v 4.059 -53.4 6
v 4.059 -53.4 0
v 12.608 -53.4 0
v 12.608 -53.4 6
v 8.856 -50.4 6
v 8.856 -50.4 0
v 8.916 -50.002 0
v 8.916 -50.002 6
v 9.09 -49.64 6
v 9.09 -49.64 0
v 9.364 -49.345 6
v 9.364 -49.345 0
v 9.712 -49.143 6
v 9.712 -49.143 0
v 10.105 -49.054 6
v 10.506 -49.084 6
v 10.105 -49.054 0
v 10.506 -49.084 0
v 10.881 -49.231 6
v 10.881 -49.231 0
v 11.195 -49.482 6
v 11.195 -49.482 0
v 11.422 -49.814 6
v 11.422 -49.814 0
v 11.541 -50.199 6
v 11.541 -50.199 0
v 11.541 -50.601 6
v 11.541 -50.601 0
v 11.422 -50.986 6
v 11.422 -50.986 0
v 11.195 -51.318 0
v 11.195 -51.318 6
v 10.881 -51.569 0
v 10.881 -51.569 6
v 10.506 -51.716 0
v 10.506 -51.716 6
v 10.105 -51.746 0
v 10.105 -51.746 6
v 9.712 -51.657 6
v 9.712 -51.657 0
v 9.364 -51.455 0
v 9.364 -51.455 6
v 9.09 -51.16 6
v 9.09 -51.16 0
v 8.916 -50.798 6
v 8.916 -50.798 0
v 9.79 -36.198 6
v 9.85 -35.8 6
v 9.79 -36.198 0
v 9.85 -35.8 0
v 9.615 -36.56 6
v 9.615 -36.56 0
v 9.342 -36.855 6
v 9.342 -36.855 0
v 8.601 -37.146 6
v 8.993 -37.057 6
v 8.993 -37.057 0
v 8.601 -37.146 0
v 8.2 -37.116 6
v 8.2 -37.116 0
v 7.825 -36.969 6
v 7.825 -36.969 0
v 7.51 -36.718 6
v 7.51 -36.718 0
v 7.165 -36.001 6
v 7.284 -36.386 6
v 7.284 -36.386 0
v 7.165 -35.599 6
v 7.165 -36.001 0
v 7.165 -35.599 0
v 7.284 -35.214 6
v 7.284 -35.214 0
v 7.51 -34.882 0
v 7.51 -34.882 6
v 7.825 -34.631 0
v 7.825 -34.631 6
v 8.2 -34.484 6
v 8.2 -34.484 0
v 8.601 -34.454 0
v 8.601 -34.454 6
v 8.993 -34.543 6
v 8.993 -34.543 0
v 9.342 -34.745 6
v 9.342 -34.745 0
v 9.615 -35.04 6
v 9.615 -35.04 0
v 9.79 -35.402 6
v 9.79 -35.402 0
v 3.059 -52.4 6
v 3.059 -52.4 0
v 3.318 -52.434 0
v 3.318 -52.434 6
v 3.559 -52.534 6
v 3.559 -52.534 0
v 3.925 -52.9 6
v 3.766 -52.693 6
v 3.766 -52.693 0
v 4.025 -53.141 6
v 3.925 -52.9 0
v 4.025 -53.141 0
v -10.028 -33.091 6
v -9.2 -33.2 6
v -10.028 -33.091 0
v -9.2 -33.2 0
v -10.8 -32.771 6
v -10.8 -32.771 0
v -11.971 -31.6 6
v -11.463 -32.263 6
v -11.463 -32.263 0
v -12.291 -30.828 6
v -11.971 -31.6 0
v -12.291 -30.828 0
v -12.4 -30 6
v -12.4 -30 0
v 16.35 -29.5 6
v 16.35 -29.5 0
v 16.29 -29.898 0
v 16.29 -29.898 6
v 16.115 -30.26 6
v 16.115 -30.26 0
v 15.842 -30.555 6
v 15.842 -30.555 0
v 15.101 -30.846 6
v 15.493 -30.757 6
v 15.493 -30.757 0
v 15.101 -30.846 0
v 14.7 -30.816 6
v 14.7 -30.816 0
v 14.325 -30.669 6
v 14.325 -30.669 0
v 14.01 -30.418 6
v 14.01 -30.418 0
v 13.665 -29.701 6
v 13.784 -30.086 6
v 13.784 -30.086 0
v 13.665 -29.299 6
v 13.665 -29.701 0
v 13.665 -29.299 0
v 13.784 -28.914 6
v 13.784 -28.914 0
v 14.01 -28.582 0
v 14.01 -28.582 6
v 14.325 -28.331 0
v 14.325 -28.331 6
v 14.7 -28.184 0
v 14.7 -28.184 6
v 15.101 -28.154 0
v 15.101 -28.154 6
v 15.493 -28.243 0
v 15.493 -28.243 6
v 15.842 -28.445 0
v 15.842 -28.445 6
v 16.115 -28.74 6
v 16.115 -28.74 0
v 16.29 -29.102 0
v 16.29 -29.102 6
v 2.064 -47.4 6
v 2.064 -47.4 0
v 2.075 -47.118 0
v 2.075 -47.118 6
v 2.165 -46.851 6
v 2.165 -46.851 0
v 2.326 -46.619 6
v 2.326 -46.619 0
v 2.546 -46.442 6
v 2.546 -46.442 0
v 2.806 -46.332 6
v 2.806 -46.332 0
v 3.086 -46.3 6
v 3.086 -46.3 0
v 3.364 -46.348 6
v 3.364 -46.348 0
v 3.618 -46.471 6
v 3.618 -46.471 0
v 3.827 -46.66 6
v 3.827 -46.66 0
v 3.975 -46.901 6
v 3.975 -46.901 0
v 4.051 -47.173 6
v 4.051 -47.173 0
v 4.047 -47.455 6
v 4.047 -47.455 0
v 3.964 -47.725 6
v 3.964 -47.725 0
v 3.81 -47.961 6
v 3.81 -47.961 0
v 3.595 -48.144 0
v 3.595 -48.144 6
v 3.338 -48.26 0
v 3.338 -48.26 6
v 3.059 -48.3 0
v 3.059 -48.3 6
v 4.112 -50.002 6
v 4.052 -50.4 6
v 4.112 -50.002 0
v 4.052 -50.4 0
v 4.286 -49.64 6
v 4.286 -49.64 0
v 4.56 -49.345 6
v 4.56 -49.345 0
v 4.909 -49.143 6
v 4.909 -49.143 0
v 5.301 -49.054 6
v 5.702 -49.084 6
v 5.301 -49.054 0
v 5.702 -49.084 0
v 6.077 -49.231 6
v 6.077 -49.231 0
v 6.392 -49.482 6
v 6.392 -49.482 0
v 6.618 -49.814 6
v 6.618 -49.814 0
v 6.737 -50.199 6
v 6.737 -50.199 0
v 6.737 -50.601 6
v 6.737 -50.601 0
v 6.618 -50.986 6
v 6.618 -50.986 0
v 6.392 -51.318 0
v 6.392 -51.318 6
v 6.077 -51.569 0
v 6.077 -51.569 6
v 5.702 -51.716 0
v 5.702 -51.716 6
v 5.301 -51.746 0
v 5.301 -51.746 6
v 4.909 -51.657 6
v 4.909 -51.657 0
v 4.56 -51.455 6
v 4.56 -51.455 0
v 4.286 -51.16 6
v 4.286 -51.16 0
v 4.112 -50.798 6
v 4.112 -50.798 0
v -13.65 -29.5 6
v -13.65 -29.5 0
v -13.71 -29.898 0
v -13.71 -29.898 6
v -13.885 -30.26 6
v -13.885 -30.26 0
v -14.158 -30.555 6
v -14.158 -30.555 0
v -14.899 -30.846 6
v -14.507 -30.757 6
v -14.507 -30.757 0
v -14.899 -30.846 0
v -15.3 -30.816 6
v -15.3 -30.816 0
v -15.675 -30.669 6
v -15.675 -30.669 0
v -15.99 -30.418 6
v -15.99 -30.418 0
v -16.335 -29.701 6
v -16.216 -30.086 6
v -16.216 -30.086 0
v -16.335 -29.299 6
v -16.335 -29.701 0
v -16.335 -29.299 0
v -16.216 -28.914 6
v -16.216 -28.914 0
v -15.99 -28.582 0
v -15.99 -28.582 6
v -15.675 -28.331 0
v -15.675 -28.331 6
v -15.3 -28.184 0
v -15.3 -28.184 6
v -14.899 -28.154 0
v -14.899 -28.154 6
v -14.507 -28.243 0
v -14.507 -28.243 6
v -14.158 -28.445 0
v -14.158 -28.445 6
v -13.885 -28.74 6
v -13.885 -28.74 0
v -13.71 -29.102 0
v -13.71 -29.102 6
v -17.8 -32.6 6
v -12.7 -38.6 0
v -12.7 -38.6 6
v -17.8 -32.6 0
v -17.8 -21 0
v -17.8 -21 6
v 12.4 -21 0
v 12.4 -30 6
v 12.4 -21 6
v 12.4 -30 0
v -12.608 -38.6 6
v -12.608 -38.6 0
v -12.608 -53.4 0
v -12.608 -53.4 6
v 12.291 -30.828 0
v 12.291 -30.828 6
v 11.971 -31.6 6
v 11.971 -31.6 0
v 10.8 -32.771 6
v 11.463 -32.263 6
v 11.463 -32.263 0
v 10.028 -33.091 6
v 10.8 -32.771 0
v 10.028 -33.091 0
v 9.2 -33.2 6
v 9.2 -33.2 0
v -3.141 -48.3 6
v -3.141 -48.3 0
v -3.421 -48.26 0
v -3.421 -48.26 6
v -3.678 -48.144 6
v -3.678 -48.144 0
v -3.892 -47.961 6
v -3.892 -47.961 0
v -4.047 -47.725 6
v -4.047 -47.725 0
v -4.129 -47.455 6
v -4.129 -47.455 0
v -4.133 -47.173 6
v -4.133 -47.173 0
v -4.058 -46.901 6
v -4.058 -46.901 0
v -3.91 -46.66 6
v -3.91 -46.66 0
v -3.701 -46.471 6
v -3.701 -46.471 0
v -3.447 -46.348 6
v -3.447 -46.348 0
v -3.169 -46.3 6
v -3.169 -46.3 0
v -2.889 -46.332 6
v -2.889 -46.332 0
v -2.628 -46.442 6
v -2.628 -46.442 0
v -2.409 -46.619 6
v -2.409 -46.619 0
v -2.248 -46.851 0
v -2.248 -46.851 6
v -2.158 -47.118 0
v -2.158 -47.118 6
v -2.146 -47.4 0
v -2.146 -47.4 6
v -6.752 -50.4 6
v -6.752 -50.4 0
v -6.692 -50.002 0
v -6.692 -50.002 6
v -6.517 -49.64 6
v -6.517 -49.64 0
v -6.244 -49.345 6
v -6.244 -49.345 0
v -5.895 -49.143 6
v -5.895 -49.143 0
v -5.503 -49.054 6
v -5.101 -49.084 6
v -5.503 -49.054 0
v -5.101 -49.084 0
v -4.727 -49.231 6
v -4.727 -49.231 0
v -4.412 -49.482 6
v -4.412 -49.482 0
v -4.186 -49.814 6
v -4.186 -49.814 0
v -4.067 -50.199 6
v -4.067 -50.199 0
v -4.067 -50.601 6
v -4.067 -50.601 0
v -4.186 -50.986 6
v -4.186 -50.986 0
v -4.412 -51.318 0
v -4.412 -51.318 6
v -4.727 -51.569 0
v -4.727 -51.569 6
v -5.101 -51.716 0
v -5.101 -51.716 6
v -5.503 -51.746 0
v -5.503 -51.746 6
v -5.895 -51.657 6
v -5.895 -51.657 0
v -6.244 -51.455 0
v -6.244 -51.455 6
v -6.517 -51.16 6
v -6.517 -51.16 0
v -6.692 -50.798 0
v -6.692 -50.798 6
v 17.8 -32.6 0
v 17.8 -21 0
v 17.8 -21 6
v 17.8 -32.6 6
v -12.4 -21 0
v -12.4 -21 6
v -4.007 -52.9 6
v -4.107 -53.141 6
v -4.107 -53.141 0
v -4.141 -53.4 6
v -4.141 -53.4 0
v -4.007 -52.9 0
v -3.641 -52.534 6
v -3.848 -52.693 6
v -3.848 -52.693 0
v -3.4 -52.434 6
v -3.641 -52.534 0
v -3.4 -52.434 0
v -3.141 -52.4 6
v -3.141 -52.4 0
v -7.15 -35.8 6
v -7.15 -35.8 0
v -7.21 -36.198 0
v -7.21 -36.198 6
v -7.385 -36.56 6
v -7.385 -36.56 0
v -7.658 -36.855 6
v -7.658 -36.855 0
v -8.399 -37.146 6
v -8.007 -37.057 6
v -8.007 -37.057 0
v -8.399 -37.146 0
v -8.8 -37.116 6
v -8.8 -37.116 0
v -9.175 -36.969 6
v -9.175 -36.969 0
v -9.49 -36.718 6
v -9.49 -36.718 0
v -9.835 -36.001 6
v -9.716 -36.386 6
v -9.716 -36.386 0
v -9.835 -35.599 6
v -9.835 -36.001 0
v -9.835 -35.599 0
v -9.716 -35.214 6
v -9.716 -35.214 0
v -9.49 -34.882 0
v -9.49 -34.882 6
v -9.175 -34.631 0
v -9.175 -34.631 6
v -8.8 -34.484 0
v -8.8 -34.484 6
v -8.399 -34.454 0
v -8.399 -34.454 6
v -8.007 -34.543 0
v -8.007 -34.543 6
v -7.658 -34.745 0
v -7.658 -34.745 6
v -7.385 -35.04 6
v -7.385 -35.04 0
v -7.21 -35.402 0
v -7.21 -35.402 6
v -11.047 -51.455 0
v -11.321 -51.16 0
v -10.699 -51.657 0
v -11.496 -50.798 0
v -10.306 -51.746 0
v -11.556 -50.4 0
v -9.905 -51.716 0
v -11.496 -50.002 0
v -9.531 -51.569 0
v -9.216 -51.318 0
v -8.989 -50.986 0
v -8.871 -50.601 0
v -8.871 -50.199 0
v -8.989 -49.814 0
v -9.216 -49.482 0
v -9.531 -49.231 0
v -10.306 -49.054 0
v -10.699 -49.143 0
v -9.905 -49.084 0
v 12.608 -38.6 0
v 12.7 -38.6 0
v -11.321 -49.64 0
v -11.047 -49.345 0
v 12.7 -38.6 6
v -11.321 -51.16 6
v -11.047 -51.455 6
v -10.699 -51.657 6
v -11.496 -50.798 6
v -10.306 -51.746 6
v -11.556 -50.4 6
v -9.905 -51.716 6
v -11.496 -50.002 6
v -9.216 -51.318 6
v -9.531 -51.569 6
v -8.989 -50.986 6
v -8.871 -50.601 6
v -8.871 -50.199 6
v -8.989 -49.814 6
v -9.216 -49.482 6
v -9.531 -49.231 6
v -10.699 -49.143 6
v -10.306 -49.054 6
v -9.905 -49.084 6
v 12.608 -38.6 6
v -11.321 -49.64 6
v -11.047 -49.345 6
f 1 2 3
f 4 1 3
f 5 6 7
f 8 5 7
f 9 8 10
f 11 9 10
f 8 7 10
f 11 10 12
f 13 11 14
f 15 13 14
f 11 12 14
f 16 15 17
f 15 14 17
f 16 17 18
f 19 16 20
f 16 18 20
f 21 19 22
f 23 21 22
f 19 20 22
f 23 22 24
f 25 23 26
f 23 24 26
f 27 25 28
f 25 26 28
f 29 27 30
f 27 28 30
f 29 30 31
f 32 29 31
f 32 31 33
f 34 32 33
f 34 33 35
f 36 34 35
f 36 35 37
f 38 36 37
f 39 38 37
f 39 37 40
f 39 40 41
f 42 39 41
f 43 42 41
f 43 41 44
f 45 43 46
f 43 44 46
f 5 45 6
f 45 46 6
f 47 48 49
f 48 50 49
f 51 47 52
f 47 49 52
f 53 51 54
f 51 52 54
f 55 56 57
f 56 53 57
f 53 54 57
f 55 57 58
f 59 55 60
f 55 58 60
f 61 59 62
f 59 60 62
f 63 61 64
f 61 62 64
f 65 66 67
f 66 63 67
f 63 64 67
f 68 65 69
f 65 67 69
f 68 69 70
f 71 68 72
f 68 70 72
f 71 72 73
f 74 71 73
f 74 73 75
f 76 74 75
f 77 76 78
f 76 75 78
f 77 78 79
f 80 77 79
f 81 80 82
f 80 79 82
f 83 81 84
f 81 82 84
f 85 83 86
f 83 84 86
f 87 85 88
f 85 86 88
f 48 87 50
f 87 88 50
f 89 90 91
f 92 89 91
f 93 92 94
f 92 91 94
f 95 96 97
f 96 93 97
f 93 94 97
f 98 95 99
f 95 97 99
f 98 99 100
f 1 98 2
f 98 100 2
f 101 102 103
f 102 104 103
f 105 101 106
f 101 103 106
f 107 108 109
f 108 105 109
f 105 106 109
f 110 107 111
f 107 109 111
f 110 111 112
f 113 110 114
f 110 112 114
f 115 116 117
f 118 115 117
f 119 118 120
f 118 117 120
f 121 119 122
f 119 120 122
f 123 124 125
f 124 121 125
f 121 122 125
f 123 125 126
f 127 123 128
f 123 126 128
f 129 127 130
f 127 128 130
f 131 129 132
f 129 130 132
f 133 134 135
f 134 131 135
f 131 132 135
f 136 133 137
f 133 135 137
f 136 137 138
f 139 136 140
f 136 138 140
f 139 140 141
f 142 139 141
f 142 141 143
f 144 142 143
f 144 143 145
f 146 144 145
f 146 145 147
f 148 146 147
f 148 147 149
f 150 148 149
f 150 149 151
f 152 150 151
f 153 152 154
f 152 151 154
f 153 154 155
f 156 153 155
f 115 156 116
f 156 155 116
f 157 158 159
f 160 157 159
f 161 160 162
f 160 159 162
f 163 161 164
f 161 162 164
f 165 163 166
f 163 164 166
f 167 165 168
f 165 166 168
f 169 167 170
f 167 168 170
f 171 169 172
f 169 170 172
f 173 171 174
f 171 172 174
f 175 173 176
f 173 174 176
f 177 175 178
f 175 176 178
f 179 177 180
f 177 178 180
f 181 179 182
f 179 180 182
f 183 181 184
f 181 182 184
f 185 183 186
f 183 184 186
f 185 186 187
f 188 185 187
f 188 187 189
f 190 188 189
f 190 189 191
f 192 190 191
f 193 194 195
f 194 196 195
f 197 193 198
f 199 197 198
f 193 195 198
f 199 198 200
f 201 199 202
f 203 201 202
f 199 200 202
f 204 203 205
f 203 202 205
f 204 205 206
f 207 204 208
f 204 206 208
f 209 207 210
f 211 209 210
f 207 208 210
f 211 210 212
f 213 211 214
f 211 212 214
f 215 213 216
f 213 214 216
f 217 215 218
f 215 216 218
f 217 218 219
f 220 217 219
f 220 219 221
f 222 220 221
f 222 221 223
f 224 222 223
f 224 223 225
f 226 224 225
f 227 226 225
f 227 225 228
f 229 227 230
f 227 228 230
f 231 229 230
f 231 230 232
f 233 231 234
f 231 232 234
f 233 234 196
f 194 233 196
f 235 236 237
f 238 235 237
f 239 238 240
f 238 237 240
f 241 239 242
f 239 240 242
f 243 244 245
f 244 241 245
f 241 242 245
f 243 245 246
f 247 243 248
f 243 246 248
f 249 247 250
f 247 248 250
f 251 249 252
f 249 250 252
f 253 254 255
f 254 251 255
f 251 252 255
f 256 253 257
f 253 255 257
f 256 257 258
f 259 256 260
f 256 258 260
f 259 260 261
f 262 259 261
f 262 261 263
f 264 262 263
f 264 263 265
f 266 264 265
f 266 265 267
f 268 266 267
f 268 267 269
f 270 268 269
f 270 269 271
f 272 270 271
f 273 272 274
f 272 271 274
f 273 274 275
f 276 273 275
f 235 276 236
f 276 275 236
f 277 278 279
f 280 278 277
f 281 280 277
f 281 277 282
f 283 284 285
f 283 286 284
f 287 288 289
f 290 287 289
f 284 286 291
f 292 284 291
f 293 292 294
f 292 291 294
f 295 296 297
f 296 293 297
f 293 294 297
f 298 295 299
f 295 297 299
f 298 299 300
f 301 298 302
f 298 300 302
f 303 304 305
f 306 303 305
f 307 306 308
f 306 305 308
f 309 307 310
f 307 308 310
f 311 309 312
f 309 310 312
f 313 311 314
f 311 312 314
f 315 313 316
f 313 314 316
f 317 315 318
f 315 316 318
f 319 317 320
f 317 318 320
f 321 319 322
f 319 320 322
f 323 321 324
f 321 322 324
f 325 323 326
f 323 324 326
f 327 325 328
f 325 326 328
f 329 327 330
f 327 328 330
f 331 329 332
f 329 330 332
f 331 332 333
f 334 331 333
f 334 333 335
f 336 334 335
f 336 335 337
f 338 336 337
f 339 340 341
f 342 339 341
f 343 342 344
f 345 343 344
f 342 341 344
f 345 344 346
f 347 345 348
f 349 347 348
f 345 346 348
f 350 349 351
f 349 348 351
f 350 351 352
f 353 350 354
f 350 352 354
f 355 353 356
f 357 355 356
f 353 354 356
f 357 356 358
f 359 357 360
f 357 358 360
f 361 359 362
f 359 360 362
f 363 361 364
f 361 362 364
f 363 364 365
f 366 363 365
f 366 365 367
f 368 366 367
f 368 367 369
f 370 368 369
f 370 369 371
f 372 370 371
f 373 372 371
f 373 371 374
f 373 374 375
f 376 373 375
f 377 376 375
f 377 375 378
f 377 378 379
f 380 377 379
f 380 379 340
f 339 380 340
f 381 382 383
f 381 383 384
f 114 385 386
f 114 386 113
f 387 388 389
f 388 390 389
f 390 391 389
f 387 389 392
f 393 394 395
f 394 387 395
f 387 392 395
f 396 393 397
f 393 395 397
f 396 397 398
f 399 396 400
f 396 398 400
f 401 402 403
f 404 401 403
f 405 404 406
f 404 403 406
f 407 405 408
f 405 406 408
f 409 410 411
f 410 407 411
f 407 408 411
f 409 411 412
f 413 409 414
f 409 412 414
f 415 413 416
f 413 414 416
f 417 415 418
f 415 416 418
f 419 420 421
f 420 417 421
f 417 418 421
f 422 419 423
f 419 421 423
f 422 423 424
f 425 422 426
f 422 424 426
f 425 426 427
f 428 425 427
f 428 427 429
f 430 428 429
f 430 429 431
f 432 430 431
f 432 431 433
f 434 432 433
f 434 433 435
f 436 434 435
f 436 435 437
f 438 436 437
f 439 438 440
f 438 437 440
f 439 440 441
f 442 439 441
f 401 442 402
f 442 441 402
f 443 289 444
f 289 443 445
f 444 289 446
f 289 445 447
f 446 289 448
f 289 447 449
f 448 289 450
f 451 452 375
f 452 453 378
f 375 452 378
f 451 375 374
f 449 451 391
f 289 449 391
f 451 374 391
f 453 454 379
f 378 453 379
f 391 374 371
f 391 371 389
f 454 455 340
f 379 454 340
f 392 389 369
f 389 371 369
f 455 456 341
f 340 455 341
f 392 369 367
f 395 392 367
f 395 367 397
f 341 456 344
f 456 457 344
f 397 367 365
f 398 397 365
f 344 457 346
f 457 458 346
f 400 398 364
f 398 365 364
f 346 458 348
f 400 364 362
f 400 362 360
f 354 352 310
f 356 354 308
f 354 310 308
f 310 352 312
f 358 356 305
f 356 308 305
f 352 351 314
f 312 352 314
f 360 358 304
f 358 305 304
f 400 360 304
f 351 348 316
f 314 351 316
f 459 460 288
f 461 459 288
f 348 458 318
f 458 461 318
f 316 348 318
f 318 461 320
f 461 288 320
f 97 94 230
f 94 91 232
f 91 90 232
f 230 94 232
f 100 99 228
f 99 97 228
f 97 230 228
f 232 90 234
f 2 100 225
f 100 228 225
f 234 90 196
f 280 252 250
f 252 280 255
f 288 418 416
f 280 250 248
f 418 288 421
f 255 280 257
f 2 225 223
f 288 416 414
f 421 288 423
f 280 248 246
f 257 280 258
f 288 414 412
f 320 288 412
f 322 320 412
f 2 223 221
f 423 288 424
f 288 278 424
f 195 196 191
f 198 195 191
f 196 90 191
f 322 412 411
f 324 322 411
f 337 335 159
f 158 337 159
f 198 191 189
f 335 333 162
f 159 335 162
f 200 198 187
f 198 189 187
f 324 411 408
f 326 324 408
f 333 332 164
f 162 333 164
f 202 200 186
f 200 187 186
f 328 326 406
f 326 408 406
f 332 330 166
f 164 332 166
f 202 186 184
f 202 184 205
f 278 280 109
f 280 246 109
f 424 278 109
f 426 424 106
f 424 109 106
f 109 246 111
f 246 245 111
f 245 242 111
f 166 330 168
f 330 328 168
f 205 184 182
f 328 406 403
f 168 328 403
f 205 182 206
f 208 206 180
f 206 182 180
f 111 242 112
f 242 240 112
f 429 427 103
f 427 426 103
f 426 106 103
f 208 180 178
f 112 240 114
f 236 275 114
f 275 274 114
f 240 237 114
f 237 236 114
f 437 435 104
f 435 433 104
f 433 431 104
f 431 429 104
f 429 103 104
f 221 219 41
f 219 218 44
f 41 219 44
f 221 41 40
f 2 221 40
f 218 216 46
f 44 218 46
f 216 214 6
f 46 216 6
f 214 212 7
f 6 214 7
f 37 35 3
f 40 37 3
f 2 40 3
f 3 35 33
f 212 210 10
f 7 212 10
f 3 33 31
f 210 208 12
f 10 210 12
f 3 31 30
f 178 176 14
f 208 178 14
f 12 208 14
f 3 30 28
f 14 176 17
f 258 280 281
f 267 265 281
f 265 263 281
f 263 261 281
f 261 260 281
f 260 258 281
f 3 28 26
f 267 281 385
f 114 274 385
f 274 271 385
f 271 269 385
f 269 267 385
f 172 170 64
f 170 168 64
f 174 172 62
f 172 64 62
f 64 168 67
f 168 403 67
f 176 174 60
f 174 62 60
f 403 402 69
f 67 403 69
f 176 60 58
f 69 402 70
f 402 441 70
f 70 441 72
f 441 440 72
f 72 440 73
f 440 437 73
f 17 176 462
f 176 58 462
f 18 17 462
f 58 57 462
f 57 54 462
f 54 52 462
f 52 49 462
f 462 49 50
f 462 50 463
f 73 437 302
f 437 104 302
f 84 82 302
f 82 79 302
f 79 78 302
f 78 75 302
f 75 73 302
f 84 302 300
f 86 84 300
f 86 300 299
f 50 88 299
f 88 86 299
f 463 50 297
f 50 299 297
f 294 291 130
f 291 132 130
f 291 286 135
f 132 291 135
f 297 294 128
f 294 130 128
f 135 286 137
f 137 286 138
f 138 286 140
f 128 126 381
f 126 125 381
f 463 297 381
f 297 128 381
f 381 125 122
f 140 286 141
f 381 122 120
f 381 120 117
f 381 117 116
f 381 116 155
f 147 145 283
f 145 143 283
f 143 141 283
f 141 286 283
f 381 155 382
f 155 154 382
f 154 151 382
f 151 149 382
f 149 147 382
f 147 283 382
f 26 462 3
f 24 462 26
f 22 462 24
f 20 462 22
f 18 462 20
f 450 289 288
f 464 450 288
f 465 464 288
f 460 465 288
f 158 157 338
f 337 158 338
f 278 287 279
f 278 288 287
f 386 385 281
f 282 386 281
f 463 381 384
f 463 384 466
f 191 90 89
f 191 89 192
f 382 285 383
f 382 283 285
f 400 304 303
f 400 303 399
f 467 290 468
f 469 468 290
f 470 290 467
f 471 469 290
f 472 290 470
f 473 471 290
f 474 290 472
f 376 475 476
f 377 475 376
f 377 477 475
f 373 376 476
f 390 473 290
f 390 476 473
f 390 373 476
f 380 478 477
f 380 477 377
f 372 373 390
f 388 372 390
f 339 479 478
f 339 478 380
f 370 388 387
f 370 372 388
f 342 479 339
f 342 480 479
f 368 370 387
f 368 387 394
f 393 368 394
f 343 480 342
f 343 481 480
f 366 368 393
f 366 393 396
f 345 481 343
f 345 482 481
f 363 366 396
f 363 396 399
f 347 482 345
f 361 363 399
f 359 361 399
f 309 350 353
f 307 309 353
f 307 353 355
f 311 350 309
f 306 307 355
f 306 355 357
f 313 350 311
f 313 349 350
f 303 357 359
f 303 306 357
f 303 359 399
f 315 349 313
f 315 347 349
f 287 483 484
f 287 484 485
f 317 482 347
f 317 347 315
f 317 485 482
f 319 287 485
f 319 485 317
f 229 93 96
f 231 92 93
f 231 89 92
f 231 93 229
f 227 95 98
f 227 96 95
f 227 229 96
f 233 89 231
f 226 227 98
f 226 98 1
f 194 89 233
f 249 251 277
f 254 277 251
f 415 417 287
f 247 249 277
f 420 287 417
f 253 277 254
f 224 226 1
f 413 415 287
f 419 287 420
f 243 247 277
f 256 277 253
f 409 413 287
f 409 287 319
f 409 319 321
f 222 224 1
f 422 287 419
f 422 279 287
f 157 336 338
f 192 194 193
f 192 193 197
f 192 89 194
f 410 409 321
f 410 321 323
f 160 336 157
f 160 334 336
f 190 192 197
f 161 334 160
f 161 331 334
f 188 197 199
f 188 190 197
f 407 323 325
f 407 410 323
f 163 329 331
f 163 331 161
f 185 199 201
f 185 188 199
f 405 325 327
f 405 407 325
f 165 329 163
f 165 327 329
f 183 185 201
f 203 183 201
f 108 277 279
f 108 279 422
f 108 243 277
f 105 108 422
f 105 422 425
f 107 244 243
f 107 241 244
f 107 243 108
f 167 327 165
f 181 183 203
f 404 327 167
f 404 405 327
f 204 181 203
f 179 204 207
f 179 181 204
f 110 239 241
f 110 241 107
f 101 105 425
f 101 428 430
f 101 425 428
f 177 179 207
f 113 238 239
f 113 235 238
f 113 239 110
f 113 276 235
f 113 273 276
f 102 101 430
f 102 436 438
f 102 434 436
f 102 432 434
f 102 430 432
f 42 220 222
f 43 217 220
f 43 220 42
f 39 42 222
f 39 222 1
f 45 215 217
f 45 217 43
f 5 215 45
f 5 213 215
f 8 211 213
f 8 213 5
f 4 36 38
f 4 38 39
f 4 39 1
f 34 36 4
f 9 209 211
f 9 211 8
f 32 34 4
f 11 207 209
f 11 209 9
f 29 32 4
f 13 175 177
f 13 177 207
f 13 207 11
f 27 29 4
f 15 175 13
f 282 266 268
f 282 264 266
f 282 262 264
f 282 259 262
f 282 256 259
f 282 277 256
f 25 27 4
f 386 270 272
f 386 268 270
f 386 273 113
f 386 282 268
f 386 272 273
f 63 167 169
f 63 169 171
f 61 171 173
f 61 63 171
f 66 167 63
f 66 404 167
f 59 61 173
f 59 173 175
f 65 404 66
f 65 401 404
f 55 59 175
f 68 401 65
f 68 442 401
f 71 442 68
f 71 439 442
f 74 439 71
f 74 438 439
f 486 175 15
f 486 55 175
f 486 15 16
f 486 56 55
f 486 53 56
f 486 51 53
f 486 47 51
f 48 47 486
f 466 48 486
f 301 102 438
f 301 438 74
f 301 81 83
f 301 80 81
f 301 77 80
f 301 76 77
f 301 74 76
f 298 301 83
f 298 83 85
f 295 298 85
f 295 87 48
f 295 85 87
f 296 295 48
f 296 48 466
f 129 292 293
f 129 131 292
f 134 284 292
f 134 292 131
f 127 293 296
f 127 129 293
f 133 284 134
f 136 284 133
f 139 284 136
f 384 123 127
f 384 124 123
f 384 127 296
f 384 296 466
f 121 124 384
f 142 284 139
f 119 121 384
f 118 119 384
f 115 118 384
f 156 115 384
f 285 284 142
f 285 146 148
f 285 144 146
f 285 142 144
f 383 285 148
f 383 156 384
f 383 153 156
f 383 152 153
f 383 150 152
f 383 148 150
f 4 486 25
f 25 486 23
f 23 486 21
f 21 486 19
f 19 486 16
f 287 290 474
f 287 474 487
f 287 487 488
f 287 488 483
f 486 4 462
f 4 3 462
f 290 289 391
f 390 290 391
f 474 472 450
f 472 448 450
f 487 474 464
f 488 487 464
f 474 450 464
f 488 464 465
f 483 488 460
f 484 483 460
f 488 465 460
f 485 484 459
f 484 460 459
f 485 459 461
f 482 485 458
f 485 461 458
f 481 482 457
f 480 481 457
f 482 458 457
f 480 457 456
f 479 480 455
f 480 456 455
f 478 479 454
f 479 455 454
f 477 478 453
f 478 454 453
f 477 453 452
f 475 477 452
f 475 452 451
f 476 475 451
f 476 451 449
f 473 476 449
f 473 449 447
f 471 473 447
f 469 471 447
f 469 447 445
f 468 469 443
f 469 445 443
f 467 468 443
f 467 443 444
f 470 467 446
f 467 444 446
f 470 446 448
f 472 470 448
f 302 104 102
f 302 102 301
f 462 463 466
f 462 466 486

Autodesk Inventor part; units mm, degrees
ref_plane "YZ Plane" through (0, 0, 0) normal (1, 0, 0) x (0, 1, 0)
ref_plane "XZ Plane" through (0, 0, 0) normal (0, 1, 0) x (-1, 0, 0)
ref_plane "XY Plane" through (0, 0, 0) normal (0, 0, 1) x (1, 0, 0)
sketch "스케치1" plane through (0, 0, 0) normal (0, 0, 1) x (1, 0, 0)
  line L0 (7.15, 10.1828) -> (7.15, 9) projected
  arc A0 (7.15, 9) -> (9.15, 7) centre (9.15, 9) ccw projected
  line L1 (9.15, 7) -> (11.2, 7) projected
  arc A1 (12.2, 6) -> (11.2, 7) centre (11.2, 6) ccw projected
  line L2 (12.2, 6) -> (12.2, -27) projected
  line L3 (-12.2, -27) -> (-12.2, 6) projected
  arc A2 (-11.2, 7) -> (-12.2, 6) centre (-11.2, 6) ccw projected
  line L4 (-11.2, 7) -> (-9.15, 7) projected
  arc A3 (-9.15, 7) -> (-7.15, 9) centre (-9.15, 9) ccw projected
  line L5 (-7.15, 9) -> (-7.15, 10.1828) projected
  spline S0 degree 3 poles (-7.15, 10.1828) (-7.15, 10.4656) (-7.1021, 10.8015) (-6.9309, 11.2744) (-6.801, 11.5043) (-6.5407, 11.7954) (-6.3826, 11.9196) (-6.2267, 12) knots -0.826314 -0.826314 -0.826314 -0.826314 -0.741468 -0.741468 -0.675447 -0.675447 -0.624321 -0.624321 -0.624321 -0.624321 projected
  line L6 (-12.7, 12) -> (-6.2267, 12) projected
  line L7 (-17.8, 6) -> (-12.7, 12) projected
  line L8 (-17.8, -32.6) -> (-17.8, 6) projected
  line L9 (17.8, 6) -> (17.8, -32.6) projected
  line L10 (12.7, 12) -> (17.8, 6) projected
  line L11 (6.2267, 12) -> (12.7, 12) projected
  spline S1 degree 3 poles (6.2267, 12) (6.3826, 11.9196) (6.5407, 11.7954) (6.801, 11.5043) (6.9309, 11.2744) (7.1021, 10.8015) (7.15, 10.4656) (7.15, 10.1828) knots -0.510875 -0.510875 -0.510875 -0.510875 -0.459749 -0.459749 -0.393728 -0.393728 -0.308882 -0.308882 -0.308882 -0.308882 projected
  circle A4 centre (15, 4.5) radius 1.35 projected
  circle A5 centre (-15, 4.5) radius 1.35 projected
  line L12 (-10.5, -74.2) -> (10.5, -74.2) projected
  line L13 (10.5, -73.725) -> (10.5, -68.6) projected
  line L14 (10.5, -68.6) -> (13, -68.6) projected
  line L15 (13, -68.6) -> (15, -68.6) projected
  line L16 (15, -74.6) -> (15, -68.6) projected
  line L17 (10.5, -74.6) -> (10.5, -73.725) projected
  line L18 (-10.5, -73.725) -> (-10.5, -68.6) projected
  line L19 (-10.5, -74.6) -> (-10.5, -73.725) projected
  line L20 (-10.5, -68.6) -> (-13, -68.6) projected
  line L21 (-13, -68.6) -> (-15, -68.6) projected
  line L22 (-15, -74.6) -> (-15, -68.6) projected
  line L23 (-16.75, -74.2) -> (-15, -74.2) projected
  line L24 (-12.6075, -38.4) -> (-12.6075, -53.4)
  line L25 (-12.6075, -53.4) -> (12.6075, -53.4)
  line L26 (12.6075, -53.4) -> (12.6075, -38.4)
  line L27 (-3.0413, -53.4) -> (2.9587, -53.4) projected
  line L28 (-3.0413, -53.4) -> (2.9587, -53.4)
  line L29 (-3.1413, -53.5) -> (3.0587, -53.5)
  line L30 (3.0587, -53.5) -> (3.0587, -47.3)
  line L31 (3.0587, -47.3) -> (-3.1413, -47.3)
  line L32 (-3.1413, -47.3) -> (-3.1413, -53.5)
  circle A6 centre (-3.1413, -47.3) radius 1
  circle A7 centre (-3.1413, -53.4) radius 1
  circle A8 centre (3.0587, -47.3) radius 1
  circle A9 centre (3.0587, -53.4) radius 1
  circle A10 centre (7.8038, -50.4) radius 1.25 projected
  circle A11 centre (-7.8037, -50.4) radius 1.25 projected
  line L33 (21, -65.4) -> (-21, -65.4) projected
  line L34 (-21, -65.4) -> (-21, -59.4) projected
  line L35 (-12.6075, -59.4) -> (-21, -59.4) projected
  line L36 (-12.6075, -59.4) -> (-12.6075, -47.4) projected
  line L37 (12.6075, -47.4) -> (-12.6075, -47.4) projected
  line L38 (12.6075, -59.4) -> (12.6075, -47.4) projected
  line L39 (21, -59.4) -> (12.6075, -59.4) projected
  line L40 (21, -65.4) -> (21, -59.4) projected
  line L41 (12.7, 12) -> (9.2, 12) projected
  line L42 (12.7, 12) -> (17.8, 6) projected
  line L43 (17.8, 6) -> (17.8, -32.6) projected
  line L44 (17.8, -32.6) -> (12.7, -38.6) projected
  line L45 (12.7, -38.6) -> (-12.7, -38.6) projected
  line L46 (-12.7, -38.6) -> (-17.8, -32.6) projected
  line L47 (-17.8, -32.6) -> (-17.8, 6) projected
  line L48 (-17.8, 6) -> (-12.7, 12) projected
  line L49 (-9.2, 12) -> (-12.7, 12) projected
  arc A12 (-9.2, 12) -> (-12.2, 9) centre (-9.2, 9) ccw projected
  line L50 (-12.2, -30) -> (-12.2, 9) projected
  arc A13 (-12.2, -30) -> (-9.2, -33) centre (-9.2, -30) ccw projected
  line L51 (9.2, -33) -> (-9.2, -33) projected
  arc A14 (9.2, -33) -> (12.2, -30) centre (9.2, -30) ccw projected
  line L52 (12.2, 9) -> (12.2, -30) projected
  arc A15 (12.2, 9) -> (9.2, 12) centre (9.2, 9) ccw projected
  circle A16 centre (15, 4.5) radius 1.35 projected
  circle A17 centre (15, -12.5) radius 1.35 projected
  circle A18 centre (8.5, -35.8) radius 1.35 projected
  circle A19 centre (-15, 4.5) radius 1.35 projected
  circle A20 centre (-15, -12.5) radius 1.35 projected
  circle A21 centre (-8.5, -35.8) radius 1.35 projected
  circle A22 centre (15, -29.5) radius 1.35 projected
  circle A23 centre (-15, -29.5) radius 1.35 projected
  line L53 (-12.7, 11.8) -> (-10.7492, 11.8)
  arc A24 (-10.7492, 11.8) -> (-12.4, 9) centre (-9.2, 9) ccw
  line L54 (-12.4, 9) -> (-12.4, -30)
  arc A25 (-12.4, -30) -> (-9.2, -33.2) centre (-9.2, -30) ccw
  line L55 (-9.2, -33.2) -> (9.2, -33.2)
  arc A26 (9.2, -33.2) -> (12.4, -30) centre (9.2, -30) ccw
  line L56 (12.4, -30) -> (12.4, 9)
  arc A27 (12.4, 9) -> (10.7492, 11.8) centre (9.2, 9) ccw
  line L57 (10.7492, 11.8) -> (12.7, 11.8)
  line L58 (-17.6, -21) -> (-12.3919, -21) projected
  line L59 (-17.6, -21) -> (-17.8, -21)
  line L60 (17.5991, -21) -> (17.8, -21)
  line L61 (-12.3919, -21) -> (-12.2, -21)
  line L62 (12.4, -21) -> (12.2, -21)
  line L63 (12.4, -21) -> (17.5991, -21)
  point P0 (3.0587, -52.4)
  point P1 (4.0587, -53.4)
  point P2 (-4.1413, -53.4)
  point P3 (-3.1413, -52.4)
  point P4 (-3.1413, -48.3)
  point P5 (-2.1413, -47.3)
  point P6 (2.0587, -47.3)
  point P7 (3.0587, -48.3)
  point P8 (2.0637, -53.5)
  point P9 (2.0587, -53.4)
  point P10 (-2.1413, -53.4)
  point P11 (-2.1463, -53.5)
  point P12 (-2.1463, -47.4)
  point P13 (2.0637, -47.4)
  point P14 (12.6075, -38.6)
  point P15 (-12.4, -21)
  point P16 (-12.6075, -38.6)
  dimension "d6" = 15
  dimension "d8" = 2
  dimension "d9" = 2
  dimension "d10" = 2
  dimension "d11" = 2
  dimension "d43" = 0.2
extrude "돌출1" add sketch "스케치1" along normal blind 6 contours L9 L44 L45 L46 L8 L59 L58 L54 A25 L55 A26 L56 L63 L60 | L26 L37 A8 L31 A6 L24 L45 | L26 L25 A9 L30 A8 L37 | L37 A6 L32 A7 L25 L24 | L37 A6 L31 A8 | A10 | A11
sketch "스케치3" plane through (0, 0, 0) normal (0, 0, -1) x (-1, 0, 0)
  line L0 (3.1413, -52.4) -> (3.1413, -48.3) projected
  line L1 (12.6075, -38.6) -> (12.6075, -53.4) projected
  line L2 (7.8037, -50.4) -> (7.8037, -53.4)
  line L3 (12.6075, -53.4) -> (4.1413, -53.4) projected
  line L4 (7.8037, -50.4) -> (7.8037, -45.7034)
  line L5 (12.6075, -47.4) -> (-12.6075, -47.4) projected
  line L6 (-12.6075, -47.4) -> (-12.6075, -59.4) projected
  line L7 (-12.6075, -59.4) -> (12.6075, -59.4) projected
  line L8 (12.6075, -59.4) -> (12.6075, -47.4) projected
  line L9 (-12.6075, -53.4) -> (12.6075, -53.4)
  line L10 (4.1413, -53.4) -> (-12.6075, -53.4) projected
  line L11 (0, -53.4) -> (0, -47.4)
  circle A0 centre (10.2056, -50.4) radius 1.35
  circle A1 centre (5.4019, -50.4) radius 1.35
  circle A2 centre (-10.2056, -50.4) radius 1.35
  circle A3 centre (-5.4019, -50.4) radius 1.35
  point P0 (0, 0)
  point P1 (12.6075, -38.4)
  point P2 (-4.0587, -53.4)
  point P3 (-3.0587, -53.4)
extrude "돌출2" cut sketch "스케치3" against normal up to next contours A0 | A1 | A2 | A3
properties part number "arm_connect_5" material "PMMA 플라스틱"
